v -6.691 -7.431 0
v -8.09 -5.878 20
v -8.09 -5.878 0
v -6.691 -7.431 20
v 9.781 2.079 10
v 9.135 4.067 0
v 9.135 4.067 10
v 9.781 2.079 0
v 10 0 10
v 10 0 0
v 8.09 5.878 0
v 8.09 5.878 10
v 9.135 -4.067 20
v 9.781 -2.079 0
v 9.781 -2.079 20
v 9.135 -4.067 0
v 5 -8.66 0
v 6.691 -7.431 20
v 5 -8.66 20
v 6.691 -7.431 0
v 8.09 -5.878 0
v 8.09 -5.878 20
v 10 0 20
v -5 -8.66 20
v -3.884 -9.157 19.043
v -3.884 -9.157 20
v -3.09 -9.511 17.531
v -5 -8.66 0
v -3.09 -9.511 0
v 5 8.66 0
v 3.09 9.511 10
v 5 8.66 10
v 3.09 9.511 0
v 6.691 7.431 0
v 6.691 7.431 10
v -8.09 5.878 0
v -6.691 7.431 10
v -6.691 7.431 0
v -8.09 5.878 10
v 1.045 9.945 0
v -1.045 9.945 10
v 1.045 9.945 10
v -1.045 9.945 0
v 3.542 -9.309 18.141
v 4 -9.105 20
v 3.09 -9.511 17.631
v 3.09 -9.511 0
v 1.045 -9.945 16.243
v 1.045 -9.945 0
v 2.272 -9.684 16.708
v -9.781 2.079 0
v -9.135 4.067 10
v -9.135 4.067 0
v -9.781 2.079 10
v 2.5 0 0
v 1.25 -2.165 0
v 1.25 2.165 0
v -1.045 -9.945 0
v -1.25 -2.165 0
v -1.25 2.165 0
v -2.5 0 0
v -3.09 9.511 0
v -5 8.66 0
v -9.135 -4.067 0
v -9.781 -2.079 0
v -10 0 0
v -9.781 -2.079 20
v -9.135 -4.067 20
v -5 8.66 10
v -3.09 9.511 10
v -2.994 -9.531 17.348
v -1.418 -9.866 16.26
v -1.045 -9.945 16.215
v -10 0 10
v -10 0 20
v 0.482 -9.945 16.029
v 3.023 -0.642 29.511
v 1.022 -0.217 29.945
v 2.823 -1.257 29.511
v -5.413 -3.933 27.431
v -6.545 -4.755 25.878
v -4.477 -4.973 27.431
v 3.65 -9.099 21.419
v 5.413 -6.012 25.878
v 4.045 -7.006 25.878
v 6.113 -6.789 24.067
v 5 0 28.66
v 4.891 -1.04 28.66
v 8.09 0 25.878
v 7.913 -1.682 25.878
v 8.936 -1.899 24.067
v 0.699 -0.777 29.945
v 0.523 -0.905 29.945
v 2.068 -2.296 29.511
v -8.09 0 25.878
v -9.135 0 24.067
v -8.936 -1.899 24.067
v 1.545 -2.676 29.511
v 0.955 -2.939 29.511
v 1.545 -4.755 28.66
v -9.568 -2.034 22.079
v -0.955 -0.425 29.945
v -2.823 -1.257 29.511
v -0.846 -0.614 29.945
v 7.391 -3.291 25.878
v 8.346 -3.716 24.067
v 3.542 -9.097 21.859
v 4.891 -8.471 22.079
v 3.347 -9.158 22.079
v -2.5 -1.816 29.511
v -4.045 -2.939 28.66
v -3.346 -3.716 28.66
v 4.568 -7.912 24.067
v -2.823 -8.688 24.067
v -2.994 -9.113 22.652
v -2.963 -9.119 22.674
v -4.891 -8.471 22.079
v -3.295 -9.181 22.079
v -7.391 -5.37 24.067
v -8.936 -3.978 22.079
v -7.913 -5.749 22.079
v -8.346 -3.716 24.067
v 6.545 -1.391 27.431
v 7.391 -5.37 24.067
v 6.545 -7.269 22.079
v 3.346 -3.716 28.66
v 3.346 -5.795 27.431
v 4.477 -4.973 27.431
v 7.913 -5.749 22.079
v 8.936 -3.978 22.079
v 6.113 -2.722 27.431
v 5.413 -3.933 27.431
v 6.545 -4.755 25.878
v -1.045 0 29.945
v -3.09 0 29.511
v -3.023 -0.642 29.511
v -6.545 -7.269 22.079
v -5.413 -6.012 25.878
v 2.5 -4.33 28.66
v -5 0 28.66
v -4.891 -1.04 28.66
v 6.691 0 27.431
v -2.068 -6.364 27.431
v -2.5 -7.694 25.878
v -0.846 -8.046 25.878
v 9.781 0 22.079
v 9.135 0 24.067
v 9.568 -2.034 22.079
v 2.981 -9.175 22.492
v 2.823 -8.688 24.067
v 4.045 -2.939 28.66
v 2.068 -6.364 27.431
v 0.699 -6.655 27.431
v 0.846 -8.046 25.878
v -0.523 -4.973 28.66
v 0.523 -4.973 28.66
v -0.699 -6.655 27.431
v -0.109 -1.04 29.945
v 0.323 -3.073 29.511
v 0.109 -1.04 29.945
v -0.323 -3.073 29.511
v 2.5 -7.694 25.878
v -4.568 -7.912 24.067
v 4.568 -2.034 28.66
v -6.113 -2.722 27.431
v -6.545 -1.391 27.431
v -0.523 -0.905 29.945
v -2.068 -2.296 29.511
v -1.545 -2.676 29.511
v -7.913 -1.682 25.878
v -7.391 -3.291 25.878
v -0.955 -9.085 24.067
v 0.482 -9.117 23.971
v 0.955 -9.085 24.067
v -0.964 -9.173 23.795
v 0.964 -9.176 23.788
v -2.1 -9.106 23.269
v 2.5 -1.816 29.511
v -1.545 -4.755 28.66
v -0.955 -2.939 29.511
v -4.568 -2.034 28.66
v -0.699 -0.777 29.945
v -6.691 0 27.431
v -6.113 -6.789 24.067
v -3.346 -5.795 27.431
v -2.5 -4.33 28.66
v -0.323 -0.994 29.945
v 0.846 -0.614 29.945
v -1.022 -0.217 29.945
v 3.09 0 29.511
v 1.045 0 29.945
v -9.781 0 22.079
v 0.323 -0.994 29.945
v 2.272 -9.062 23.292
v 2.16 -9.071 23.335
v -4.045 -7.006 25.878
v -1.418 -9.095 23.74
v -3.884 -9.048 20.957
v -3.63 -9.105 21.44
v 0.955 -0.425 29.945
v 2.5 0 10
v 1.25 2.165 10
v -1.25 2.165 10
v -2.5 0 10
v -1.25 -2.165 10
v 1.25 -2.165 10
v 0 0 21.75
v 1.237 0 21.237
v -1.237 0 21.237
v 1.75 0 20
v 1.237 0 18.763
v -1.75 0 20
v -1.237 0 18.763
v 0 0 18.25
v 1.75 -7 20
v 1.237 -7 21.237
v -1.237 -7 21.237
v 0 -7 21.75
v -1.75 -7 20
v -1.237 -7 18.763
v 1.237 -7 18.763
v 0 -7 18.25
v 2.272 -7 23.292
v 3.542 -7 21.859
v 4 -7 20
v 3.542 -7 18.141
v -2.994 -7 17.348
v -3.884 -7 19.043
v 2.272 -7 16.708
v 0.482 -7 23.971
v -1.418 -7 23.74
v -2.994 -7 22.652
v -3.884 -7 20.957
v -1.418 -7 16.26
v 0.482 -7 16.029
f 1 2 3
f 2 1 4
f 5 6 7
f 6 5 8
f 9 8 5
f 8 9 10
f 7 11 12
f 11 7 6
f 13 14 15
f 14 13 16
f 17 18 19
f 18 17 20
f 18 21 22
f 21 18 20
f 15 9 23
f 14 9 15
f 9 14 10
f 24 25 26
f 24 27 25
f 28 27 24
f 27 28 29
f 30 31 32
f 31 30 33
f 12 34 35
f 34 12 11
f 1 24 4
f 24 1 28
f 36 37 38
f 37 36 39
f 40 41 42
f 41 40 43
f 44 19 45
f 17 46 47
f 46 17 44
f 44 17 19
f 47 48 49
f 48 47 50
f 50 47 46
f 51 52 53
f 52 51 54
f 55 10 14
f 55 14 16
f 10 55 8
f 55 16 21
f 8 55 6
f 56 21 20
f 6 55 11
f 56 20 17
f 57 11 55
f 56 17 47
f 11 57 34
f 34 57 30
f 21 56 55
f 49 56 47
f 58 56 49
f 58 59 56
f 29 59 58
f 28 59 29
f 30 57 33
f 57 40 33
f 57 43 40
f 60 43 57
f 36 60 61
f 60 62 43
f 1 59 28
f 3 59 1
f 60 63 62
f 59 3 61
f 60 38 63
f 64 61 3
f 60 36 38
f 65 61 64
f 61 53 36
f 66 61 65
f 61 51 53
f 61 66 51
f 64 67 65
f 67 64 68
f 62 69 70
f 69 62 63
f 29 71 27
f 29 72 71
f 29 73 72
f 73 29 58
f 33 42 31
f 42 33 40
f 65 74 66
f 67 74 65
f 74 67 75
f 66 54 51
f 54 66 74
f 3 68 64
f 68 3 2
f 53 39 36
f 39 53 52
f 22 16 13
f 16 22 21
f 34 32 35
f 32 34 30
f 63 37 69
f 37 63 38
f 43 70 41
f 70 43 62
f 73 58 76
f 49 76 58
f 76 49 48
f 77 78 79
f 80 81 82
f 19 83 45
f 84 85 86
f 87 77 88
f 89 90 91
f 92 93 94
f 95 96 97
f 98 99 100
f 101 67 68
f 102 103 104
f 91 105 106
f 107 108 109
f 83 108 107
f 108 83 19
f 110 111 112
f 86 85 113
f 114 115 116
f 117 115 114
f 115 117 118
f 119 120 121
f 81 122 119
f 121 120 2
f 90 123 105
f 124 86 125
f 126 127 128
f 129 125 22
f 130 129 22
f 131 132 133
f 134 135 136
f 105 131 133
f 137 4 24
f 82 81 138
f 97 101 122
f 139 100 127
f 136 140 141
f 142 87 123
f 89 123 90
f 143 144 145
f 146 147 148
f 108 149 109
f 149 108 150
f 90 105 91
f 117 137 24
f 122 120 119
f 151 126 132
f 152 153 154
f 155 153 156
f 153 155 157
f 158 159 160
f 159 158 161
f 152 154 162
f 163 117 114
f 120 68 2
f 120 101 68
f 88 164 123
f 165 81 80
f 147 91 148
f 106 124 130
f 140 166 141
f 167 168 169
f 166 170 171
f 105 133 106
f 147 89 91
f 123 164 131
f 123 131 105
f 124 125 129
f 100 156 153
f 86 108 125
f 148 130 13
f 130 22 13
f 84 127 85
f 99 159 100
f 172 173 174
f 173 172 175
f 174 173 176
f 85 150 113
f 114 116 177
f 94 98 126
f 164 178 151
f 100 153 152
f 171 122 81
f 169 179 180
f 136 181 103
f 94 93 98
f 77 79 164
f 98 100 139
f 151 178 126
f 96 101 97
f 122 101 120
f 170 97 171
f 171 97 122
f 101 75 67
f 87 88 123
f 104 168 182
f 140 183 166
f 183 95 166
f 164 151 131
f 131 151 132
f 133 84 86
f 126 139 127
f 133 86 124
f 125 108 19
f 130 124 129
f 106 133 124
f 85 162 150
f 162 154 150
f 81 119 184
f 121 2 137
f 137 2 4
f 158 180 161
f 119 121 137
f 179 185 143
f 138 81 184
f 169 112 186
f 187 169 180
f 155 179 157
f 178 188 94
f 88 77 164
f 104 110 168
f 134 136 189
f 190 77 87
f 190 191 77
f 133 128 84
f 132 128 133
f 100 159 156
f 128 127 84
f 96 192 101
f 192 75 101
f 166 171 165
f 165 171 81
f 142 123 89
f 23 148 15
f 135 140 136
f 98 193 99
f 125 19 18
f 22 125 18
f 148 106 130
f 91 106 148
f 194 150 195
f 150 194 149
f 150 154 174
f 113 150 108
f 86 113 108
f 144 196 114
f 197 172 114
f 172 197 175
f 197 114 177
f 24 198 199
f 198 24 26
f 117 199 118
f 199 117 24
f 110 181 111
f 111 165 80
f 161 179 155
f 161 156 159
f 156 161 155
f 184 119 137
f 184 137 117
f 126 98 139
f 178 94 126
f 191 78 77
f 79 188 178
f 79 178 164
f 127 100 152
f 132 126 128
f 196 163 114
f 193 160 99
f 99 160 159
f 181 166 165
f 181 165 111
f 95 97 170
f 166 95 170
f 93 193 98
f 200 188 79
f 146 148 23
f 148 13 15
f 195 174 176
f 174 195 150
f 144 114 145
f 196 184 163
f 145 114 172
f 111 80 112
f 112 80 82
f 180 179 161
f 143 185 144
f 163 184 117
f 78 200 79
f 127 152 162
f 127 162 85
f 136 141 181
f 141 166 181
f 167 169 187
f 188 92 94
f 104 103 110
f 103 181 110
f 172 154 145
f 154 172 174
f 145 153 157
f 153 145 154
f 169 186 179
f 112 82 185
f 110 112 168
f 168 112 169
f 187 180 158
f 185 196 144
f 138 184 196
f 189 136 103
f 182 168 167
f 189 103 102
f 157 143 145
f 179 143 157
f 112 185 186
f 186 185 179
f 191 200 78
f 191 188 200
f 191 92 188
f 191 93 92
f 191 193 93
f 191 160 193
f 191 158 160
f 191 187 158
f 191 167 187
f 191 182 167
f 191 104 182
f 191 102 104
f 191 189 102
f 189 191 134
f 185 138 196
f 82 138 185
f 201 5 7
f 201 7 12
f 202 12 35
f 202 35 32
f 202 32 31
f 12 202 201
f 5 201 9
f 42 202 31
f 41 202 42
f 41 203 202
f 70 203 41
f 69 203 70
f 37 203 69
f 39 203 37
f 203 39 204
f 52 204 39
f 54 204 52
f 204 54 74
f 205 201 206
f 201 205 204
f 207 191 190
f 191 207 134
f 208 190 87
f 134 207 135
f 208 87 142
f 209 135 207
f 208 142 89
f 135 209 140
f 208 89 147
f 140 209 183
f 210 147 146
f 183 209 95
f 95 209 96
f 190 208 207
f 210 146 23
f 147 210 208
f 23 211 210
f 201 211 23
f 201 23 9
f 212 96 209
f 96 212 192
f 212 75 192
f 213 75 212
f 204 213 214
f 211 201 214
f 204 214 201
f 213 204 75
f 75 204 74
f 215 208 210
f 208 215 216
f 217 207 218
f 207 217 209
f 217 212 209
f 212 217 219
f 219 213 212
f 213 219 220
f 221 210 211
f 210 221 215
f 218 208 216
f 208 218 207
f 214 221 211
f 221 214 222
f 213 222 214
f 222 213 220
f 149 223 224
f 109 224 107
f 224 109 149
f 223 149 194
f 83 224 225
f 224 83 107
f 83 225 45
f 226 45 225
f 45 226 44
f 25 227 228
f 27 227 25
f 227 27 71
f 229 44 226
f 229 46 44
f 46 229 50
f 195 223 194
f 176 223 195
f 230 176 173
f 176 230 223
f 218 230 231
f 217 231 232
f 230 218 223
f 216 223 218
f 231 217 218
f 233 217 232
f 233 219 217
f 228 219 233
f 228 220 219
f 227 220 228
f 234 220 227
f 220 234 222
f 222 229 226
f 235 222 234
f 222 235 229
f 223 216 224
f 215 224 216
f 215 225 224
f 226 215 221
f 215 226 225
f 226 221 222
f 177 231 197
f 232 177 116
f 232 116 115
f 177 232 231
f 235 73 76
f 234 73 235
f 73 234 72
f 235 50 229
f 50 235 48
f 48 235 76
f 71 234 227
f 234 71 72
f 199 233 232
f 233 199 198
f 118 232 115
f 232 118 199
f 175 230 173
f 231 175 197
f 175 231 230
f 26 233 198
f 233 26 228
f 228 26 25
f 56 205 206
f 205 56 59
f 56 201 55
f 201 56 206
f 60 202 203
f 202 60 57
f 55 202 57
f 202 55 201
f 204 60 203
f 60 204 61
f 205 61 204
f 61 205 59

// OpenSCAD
difference() {
    union() {
        cylinder(h=20,d=20);
        translate([0,0,20]) sphere(10);
    }

    translate([-10,0,10]) {
        cube([20,10,20]);
    }

    translate([0,0,20]) {
        rotate([90,0,0]) {
            cylinder(d=3.5,h=10,$fn=8);
        }
    }

    translate([0,-7,20]) {
        rotate([90,0,0]) {
            cylinder(d=8,h=10);
        }
    }        
    
    cylinder(h=10,d=5,$fn=6);
}
